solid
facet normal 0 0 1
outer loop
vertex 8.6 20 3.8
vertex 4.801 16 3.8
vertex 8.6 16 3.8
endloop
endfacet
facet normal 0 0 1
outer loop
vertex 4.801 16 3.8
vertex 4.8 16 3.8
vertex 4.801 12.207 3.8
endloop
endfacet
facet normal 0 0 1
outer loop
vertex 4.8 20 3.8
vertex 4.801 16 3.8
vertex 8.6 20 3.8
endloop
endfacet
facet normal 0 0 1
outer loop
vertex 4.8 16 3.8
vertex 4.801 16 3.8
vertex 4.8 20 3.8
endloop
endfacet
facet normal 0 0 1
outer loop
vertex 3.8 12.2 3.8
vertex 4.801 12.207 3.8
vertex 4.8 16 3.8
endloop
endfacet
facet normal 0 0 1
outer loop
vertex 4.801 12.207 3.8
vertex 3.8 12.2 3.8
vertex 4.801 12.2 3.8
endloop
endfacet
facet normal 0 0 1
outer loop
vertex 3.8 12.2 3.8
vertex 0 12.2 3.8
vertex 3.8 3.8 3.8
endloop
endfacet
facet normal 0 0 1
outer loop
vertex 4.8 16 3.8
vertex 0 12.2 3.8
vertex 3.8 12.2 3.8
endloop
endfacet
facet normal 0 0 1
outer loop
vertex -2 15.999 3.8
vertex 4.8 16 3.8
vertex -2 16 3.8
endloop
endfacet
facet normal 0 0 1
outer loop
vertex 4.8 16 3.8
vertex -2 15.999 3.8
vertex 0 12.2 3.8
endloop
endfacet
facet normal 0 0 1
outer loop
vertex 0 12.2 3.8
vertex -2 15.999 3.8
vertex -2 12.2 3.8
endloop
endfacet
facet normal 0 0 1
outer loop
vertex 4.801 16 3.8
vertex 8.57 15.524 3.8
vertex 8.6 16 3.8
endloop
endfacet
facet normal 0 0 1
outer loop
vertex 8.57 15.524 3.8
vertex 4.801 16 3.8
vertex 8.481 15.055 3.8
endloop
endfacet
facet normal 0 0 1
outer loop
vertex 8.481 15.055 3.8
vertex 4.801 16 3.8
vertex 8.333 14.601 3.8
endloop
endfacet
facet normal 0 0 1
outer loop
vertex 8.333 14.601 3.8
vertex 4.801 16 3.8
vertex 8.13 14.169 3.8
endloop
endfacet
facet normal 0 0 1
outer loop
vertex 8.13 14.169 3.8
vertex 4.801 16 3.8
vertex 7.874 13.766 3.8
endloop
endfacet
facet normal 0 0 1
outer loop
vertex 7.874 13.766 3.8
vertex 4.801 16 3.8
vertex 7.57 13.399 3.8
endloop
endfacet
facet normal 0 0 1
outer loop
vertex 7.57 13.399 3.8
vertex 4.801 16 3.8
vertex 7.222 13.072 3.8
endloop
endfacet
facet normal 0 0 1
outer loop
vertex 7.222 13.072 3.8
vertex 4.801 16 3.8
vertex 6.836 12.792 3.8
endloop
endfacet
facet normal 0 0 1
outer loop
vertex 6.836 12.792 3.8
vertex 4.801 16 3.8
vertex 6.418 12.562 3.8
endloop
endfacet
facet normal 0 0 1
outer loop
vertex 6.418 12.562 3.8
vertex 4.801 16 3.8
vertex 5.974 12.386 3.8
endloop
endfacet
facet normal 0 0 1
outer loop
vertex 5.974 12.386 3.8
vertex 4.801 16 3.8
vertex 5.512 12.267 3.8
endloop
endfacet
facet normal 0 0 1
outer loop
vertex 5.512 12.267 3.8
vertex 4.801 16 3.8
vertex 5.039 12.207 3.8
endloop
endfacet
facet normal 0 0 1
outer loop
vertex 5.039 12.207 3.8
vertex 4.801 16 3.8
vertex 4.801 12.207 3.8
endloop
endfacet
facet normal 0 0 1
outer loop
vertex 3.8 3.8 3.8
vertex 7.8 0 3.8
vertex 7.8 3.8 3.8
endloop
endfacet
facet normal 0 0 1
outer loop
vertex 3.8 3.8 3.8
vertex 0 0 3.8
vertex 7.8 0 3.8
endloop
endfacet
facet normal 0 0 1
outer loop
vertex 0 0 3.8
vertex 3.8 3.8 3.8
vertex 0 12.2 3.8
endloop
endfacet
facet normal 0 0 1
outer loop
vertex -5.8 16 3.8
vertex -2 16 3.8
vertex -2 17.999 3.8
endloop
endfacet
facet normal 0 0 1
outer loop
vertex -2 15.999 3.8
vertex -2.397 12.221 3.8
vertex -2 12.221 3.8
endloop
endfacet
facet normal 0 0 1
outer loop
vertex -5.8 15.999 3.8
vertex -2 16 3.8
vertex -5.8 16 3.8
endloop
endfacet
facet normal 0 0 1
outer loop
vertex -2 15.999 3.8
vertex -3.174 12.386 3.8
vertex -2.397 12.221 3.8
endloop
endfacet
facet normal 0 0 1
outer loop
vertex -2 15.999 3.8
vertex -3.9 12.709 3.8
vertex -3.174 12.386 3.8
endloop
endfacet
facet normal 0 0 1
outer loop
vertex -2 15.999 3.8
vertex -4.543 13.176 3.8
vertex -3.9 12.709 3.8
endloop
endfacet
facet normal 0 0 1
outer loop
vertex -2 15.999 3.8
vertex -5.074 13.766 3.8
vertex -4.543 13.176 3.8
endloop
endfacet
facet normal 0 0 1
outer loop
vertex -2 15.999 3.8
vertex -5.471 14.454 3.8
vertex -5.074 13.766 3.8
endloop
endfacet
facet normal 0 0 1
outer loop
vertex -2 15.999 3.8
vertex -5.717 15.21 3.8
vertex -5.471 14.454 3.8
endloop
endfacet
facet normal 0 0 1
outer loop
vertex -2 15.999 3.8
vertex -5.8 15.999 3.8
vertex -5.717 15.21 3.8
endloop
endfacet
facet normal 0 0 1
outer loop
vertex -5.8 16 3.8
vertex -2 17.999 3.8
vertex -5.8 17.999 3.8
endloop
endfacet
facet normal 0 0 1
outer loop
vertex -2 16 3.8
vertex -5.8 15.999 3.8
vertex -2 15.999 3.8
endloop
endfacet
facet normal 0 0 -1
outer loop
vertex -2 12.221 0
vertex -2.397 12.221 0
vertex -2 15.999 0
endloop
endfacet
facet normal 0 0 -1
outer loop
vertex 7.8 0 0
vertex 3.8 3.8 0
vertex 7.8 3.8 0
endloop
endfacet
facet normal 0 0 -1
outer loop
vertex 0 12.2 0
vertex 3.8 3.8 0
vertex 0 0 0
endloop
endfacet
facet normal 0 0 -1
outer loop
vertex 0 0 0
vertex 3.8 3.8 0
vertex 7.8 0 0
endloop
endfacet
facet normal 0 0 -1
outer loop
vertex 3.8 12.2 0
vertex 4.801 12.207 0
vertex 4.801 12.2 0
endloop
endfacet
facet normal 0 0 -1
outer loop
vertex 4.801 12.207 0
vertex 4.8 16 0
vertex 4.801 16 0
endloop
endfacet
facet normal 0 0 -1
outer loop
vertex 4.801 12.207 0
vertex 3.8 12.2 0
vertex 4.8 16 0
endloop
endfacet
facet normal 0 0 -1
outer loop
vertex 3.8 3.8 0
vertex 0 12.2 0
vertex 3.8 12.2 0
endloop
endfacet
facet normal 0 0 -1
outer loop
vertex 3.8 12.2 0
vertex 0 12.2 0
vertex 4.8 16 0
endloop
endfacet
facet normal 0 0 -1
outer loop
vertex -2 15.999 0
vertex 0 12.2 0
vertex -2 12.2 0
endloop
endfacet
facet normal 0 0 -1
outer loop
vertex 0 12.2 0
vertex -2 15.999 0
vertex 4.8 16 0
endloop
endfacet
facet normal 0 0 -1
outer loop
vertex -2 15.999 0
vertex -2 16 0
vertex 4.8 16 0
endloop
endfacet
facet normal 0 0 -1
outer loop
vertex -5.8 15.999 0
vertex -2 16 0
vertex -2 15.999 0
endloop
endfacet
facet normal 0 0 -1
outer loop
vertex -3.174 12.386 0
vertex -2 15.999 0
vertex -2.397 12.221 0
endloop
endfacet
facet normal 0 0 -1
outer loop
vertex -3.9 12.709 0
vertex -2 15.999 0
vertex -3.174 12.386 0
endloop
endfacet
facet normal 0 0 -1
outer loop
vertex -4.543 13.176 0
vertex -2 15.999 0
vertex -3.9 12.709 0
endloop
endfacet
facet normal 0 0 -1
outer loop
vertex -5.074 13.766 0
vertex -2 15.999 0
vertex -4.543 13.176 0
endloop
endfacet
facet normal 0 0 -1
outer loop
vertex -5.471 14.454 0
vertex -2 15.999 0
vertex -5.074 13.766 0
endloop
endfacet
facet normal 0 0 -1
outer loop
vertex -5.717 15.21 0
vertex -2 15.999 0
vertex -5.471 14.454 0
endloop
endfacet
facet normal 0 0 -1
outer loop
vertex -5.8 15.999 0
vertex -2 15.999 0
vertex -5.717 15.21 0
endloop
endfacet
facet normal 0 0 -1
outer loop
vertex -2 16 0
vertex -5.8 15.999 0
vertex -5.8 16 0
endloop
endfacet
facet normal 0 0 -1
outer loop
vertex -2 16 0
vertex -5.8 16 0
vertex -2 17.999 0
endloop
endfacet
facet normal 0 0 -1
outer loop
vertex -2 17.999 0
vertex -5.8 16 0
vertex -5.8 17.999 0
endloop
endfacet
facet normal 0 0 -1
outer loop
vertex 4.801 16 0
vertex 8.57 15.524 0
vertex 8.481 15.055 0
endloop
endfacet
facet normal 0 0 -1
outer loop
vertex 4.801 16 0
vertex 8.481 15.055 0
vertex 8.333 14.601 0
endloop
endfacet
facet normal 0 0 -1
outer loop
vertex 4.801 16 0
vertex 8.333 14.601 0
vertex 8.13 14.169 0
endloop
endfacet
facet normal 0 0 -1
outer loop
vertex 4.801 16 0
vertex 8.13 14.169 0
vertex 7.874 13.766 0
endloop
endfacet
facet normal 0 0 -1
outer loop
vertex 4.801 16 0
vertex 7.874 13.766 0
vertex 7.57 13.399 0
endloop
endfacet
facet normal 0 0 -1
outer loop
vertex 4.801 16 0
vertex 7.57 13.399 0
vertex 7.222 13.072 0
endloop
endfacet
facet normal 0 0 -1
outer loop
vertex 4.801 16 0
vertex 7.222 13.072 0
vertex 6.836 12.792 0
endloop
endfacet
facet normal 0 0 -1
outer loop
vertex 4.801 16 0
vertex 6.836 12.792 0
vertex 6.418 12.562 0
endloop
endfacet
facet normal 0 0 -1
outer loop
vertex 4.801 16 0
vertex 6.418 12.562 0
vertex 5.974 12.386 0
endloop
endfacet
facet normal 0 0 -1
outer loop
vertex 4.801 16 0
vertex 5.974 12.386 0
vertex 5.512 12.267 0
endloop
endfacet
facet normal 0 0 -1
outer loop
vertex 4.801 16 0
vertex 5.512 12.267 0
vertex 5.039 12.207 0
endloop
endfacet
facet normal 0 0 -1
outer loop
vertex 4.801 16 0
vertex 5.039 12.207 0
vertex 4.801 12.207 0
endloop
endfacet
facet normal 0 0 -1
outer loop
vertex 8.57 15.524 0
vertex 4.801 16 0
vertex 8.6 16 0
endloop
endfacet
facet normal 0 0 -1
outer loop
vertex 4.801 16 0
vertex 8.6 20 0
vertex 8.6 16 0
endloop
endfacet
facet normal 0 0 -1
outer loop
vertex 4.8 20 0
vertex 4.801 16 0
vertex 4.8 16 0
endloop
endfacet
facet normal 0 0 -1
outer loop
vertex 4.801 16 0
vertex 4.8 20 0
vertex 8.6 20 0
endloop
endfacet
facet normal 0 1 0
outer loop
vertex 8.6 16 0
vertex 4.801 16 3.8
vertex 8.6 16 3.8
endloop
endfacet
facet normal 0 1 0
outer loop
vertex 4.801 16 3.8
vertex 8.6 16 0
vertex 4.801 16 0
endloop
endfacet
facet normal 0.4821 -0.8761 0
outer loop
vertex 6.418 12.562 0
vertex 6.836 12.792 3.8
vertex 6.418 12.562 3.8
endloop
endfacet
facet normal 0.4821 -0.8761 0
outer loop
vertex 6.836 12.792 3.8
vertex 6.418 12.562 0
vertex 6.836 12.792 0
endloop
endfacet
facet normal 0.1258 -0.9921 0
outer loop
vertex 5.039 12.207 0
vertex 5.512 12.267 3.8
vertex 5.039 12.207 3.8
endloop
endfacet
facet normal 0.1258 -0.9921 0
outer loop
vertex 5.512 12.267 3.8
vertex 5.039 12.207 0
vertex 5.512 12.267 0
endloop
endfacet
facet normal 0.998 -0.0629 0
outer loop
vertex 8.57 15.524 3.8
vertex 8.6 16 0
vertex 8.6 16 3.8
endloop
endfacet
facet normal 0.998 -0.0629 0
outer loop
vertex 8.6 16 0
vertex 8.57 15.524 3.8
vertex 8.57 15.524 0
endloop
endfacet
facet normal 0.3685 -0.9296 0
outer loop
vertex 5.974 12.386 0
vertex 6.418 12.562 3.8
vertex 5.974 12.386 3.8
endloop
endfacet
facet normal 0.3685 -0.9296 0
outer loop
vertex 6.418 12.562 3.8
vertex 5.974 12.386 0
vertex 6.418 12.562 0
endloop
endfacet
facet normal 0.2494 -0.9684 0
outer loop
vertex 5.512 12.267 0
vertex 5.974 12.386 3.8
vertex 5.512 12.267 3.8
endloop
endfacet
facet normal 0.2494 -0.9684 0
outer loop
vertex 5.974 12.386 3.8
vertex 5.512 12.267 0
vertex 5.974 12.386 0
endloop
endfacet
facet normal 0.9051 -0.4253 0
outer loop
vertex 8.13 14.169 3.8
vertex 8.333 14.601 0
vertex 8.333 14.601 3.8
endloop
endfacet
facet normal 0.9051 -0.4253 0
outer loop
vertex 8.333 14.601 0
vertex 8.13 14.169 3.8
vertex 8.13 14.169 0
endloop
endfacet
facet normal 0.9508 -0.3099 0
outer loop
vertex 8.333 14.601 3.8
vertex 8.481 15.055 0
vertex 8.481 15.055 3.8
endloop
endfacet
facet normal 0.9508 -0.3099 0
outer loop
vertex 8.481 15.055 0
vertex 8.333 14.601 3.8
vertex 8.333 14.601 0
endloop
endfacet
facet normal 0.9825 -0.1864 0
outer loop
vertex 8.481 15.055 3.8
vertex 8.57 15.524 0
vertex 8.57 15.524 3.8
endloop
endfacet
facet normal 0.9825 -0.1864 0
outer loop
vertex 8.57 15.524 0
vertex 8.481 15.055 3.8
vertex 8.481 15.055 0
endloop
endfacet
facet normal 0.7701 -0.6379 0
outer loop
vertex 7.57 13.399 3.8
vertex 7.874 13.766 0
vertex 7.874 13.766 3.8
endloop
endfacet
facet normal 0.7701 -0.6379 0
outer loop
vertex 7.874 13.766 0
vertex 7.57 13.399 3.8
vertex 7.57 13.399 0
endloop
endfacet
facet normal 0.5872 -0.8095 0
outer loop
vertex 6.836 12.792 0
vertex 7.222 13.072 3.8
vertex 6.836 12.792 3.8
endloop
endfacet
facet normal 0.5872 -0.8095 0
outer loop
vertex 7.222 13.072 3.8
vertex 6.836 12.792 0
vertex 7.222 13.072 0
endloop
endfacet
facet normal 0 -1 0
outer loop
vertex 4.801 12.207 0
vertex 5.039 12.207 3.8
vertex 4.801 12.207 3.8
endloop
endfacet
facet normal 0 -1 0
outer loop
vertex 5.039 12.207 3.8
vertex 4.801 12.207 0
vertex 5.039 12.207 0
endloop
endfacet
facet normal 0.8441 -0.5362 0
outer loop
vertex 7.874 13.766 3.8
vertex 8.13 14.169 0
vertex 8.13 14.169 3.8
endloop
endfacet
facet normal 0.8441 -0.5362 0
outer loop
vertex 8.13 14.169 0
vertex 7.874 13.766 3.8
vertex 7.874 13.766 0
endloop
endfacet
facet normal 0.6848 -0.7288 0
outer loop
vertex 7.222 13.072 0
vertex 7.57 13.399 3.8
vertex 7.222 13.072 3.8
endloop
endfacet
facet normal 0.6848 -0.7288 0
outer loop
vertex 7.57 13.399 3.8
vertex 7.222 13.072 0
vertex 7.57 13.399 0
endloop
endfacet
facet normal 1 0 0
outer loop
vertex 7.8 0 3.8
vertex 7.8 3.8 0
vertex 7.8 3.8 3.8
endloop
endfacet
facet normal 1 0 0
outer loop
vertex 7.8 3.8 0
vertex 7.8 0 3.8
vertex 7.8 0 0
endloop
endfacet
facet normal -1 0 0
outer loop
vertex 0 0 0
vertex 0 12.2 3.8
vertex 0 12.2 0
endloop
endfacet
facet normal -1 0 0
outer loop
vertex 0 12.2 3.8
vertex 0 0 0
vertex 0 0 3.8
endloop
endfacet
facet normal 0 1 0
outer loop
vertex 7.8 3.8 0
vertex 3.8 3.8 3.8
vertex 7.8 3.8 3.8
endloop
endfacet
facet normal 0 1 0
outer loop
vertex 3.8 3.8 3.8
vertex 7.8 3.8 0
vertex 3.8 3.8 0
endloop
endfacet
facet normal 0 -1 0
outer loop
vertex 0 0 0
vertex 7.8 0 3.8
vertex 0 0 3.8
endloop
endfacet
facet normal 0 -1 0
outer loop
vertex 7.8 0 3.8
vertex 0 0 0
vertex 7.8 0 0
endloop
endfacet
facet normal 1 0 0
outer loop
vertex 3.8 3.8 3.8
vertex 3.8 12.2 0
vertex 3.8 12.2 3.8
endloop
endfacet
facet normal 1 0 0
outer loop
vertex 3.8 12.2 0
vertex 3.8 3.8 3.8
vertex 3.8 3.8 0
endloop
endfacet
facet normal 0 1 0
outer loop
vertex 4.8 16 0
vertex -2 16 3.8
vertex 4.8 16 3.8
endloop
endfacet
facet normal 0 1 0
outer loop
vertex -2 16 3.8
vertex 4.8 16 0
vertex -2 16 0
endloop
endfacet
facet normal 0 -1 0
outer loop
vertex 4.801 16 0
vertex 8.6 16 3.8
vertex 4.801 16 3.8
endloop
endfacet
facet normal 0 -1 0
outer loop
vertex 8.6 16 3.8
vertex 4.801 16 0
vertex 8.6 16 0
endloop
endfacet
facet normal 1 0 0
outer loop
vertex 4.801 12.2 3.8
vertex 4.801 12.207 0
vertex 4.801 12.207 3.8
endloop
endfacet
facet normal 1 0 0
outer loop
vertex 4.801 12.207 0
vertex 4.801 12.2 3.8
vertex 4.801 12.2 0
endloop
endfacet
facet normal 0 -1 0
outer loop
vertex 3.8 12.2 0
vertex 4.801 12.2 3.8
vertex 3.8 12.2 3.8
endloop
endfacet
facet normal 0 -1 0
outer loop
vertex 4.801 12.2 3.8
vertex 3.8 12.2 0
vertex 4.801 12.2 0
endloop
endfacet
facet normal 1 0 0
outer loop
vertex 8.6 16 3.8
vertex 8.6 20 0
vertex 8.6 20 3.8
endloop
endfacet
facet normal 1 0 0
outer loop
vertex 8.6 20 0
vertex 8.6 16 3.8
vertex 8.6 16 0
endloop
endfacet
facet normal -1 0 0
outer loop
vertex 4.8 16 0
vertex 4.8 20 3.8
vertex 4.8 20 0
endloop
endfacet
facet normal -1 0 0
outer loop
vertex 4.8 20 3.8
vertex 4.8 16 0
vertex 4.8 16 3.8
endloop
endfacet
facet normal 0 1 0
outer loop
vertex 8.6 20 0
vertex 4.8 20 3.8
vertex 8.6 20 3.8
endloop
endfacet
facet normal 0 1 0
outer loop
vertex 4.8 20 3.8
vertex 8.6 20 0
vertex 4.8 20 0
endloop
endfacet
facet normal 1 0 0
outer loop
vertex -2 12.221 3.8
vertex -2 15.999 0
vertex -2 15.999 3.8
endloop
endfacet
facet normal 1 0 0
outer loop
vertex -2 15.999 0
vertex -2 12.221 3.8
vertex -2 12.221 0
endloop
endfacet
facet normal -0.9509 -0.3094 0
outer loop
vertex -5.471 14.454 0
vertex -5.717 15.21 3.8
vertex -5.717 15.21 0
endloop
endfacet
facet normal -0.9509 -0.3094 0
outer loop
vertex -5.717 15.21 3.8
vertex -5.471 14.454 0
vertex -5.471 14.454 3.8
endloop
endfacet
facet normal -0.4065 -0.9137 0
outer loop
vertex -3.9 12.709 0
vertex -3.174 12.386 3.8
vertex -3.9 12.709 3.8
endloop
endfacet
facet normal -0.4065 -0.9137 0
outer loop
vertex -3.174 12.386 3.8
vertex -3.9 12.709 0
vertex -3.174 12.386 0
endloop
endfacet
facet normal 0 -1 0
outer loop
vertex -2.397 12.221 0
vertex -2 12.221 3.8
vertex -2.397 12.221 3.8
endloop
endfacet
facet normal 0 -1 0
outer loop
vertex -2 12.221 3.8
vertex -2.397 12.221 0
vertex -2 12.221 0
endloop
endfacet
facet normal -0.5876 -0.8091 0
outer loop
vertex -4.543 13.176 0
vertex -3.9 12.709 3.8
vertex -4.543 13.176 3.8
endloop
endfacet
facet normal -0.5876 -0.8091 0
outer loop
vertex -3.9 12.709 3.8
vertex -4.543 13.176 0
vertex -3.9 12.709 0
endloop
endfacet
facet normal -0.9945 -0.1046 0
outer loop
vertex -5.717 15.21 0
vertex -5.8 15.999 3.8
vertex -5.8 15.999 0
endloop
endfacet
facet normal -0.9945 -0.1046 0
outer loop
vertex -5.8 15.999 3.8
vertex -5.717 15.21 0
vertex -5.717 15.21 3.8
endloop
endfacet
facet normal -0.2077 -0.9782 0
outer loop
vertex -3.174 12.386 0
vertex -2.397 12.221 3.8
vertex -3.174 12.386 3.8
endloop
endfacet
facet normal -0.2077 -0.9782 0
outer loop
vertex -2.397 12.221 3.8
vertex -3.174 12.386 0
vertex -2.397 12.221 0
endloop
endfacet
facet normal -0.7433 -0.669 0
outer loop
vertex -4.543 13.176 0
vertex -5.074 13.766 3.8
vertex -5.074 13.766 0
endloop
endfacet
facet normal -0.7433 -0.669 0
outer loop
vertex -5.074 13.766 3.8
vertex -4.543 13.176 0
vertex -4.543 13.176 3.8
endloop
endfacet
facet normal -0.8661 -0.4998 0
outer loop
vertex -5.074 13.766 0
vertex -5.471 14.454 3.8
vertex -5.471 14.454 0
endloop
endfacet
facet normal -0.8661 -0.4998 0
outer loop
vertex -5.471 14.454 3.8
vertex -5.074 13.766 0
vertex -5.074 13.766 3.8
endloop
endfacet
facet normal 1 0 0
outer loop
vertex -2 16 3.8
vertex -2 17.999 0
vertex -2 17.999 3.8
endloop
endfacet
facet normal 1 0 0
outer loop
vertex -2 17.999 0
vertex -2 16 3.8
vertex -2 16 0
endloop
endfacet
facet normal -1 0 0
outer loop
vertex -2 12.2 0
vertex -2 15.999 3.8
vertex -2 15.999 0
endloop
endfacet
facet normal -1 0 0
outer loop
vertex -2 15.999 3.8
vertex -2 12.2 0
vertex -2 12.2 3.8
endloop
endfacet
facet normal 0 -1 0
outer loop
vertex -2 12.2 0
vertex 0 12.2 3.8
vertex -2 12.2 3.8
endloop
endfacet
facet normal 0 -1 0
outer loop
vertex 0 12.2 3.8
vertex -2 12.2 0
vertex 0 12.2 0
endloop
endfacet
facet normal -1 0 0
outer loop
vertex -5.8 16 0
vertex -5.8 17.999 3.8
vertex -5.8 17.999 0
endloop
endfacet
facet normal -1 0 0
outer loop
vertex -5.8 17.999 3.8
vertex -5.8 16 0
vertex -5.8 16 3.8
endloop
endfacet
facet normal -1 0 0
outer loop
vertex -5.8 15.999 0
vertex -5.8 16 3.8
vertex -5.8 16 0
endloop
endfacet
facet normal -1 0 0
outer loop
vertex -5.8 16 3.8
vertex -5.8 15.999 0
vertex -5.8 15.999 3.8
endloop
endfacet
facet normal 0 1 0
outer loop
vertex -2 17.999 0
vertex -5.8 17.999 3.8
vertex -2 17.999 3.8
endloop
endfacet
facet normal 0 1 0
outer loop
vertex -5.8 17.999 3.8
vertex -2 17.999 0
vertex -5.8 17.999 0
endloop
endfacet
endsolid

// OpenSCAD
// file: pegboard-modules.scad
module hanger(height, width, pin_height) {
    cube([width+pin_height, width, width]);
    cube([width, height, width]);
    translate([0, height-width, 0]) cube([width + 1 + 0.001, width, width]);
    translate([width+1, height, 0]) cube([width, pin_height, width]);
    translate([width+1, height-width, 0]) intersection() {
        cube([width, width, width]);
        translate([0, width, 0]) cylinder(r=width, $fn=50, h=width);
    }
}
// main file
use <pegboard-modules.scad>;

short_height = 16;
width = 3.8;
pin_height = 4;

hanger(short_height, width, pin_height);

translate([-width-2, short_height-width, 0]) intersection() {
    cube([width, width, width]);
    translate([width, width, 0]) cylinder(r=width, $fn=30, h=width);
}
translate([-2, short_height-width, 0]) cube([2, width, width]);
translate([-width-2, short_height-0.001, 0]) cube([width, pin_height/2, width]);
